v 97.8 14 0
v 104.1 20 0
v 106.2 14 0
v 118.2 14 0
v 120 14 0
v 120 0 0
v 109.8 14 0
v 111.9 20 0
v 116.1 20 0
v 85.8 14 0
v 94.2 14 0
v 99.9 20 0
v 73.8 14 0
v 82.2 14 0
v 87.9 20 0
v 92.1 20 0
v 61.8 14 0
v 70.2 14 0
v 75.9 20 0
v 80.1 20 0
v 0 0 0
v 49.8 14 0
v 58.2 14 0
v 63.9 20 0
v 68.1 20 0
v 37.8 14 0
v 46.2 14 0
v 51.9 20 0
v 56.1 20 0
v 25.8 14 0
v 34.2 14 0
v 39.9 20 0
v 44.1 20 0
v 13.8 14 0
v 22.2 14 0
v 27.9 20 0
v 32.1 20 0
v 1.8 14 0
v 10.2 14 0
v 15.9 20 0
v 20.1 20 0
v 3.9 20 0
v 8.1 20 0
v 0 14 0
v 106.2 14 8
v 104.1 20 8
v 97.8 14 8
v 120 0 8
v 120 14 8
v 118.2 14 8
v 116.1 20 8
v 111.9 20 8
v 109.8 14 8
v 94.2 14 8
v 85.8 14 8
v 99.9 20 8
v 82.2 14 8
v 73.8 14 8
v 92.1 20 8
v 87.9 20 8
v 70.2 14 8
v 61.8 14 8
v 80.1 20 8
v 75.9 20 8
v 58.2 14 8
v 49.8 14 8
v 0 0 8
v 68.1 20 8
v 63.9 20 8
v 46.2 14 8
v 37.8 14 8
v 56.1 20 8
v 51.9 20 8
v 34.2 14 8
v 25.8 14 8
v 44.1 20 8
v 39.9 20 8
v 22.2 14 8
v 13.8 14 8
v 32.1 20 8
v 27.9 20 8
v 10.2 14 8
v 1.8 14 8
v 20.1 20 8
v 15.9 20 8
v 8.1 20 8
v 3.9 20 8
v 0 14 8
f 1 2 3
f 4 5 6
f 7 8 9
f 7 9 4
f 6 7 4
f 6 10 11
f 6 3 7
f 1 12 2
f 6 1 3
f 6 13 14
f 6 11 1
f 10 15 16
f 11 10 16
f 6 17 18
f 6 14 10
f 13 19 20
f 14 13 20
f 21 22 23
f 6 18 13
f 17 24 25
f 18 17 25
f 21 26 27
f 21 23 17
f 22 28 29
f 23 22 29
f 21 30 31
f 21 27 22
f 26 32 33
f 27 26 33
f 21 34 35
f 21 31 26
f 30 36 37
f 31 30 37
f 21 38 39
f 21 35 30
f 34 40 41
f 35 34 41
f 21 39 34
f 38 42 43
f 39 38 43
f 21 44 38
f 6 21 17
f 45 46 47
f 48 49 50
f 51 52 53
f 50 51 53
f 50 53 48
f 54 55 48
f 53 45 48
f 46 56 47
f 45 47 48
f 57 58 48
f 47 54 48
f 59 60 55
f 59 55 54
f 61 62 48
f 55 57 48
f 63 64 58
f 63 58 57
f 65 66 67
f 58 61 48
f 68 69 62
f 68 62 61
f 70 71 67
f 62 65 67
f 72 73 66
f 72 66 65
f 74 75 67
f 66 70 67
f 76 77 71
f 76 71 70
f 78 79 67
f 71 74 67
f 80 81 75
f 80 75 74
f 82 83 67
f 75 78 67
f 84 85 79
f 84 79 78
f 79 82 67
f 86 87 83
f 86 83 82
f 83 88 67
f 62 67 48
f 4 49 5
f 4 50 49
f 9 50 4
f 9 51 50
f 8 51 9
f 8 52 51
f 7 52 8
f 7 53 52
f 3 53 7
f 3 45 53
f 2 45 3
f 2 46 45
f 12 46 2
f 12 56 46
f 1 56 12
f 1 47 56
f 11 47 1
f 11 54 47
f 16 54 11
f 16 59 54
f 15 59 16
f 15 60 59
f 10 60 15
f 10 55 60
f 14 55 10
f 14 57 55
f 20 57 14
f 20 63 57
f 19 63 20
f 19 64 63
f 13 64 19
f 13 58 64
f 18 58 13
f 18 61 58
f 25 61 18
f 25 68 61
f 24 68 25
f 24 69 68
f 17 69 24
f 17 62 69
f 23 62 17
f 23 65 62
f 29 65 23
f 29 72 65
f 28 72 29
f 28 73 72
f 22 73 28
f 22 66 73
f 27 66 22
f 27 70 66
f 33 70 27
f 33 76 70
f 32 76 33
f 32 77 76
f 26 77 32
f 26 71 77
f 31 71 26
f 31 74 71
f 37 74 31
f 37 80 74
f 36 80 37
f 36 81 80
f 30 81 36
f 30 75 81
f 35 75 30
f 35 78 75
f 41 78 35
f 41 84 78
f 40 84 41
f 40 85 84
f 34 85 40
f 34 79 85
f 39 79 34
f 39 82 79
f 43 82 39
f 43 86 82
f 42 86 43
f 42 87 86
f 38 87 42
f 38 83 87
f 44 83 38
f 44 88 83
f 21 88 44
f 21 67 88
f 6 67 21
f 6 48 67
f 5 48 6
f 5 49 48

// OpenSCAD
$fn = 32;

// ----------------------------------------------------------------------
// Gear rack: 10 teeth, pitch 12 mm
// ----------------------------------------------------------------------

// --- parameters (mm) ---
teeth = 10;               // number of teeth
pitch = 12;               // tooth pitch, X
root_w = 8.4;             // tooth width at the root
tip_w = 4.2;              // tooth width at the tip
base_h = 14;              // rack body height, Y
tooth_h = 6;              // tooth height above the body
plate_t = 8;              // rack width, Z (extrusion height)

rack_l = teeth * pitch;  // overall length
total_h = base_h + tooth_h;  // overall height

profile = [[0, 0], [120, 0], [120, 14], [118.2, 14], [116.1, 20], [111.9, 20], [109.8, 14], [106.2, 14], [104.1, 20], [99.9, 20], [97.8, 14], [94.2, 14], [92.1, 20], [87.9, 20], [85.8, 14], [82.2, 14], [80.1, 20], [75.9, 20], [73.8, 14], [70.2, 14], [68.1, 20], [63.9, 20], [61.8, 14], [58.2, 14], [56.1, 20], [51.9, 20], [49.8, 14], [46.2, 14], [44.1, 20], [39.9, 20], [37.8, 14], [34.2, 14], [32.1, 20], [27.9, 20], [25.8, 14], [22.2, 14], [20.1, 20], [15.9, 20], [13.8, 14], [10.2, 14], [8.1, 20], [3.9, 20], [1.8, 14], [0, 14]];  // primary outline, 44 points, counter clockwise

// --- the one profile operation ---
linear_extrude(height = plate_t) polygon(points = profile);
